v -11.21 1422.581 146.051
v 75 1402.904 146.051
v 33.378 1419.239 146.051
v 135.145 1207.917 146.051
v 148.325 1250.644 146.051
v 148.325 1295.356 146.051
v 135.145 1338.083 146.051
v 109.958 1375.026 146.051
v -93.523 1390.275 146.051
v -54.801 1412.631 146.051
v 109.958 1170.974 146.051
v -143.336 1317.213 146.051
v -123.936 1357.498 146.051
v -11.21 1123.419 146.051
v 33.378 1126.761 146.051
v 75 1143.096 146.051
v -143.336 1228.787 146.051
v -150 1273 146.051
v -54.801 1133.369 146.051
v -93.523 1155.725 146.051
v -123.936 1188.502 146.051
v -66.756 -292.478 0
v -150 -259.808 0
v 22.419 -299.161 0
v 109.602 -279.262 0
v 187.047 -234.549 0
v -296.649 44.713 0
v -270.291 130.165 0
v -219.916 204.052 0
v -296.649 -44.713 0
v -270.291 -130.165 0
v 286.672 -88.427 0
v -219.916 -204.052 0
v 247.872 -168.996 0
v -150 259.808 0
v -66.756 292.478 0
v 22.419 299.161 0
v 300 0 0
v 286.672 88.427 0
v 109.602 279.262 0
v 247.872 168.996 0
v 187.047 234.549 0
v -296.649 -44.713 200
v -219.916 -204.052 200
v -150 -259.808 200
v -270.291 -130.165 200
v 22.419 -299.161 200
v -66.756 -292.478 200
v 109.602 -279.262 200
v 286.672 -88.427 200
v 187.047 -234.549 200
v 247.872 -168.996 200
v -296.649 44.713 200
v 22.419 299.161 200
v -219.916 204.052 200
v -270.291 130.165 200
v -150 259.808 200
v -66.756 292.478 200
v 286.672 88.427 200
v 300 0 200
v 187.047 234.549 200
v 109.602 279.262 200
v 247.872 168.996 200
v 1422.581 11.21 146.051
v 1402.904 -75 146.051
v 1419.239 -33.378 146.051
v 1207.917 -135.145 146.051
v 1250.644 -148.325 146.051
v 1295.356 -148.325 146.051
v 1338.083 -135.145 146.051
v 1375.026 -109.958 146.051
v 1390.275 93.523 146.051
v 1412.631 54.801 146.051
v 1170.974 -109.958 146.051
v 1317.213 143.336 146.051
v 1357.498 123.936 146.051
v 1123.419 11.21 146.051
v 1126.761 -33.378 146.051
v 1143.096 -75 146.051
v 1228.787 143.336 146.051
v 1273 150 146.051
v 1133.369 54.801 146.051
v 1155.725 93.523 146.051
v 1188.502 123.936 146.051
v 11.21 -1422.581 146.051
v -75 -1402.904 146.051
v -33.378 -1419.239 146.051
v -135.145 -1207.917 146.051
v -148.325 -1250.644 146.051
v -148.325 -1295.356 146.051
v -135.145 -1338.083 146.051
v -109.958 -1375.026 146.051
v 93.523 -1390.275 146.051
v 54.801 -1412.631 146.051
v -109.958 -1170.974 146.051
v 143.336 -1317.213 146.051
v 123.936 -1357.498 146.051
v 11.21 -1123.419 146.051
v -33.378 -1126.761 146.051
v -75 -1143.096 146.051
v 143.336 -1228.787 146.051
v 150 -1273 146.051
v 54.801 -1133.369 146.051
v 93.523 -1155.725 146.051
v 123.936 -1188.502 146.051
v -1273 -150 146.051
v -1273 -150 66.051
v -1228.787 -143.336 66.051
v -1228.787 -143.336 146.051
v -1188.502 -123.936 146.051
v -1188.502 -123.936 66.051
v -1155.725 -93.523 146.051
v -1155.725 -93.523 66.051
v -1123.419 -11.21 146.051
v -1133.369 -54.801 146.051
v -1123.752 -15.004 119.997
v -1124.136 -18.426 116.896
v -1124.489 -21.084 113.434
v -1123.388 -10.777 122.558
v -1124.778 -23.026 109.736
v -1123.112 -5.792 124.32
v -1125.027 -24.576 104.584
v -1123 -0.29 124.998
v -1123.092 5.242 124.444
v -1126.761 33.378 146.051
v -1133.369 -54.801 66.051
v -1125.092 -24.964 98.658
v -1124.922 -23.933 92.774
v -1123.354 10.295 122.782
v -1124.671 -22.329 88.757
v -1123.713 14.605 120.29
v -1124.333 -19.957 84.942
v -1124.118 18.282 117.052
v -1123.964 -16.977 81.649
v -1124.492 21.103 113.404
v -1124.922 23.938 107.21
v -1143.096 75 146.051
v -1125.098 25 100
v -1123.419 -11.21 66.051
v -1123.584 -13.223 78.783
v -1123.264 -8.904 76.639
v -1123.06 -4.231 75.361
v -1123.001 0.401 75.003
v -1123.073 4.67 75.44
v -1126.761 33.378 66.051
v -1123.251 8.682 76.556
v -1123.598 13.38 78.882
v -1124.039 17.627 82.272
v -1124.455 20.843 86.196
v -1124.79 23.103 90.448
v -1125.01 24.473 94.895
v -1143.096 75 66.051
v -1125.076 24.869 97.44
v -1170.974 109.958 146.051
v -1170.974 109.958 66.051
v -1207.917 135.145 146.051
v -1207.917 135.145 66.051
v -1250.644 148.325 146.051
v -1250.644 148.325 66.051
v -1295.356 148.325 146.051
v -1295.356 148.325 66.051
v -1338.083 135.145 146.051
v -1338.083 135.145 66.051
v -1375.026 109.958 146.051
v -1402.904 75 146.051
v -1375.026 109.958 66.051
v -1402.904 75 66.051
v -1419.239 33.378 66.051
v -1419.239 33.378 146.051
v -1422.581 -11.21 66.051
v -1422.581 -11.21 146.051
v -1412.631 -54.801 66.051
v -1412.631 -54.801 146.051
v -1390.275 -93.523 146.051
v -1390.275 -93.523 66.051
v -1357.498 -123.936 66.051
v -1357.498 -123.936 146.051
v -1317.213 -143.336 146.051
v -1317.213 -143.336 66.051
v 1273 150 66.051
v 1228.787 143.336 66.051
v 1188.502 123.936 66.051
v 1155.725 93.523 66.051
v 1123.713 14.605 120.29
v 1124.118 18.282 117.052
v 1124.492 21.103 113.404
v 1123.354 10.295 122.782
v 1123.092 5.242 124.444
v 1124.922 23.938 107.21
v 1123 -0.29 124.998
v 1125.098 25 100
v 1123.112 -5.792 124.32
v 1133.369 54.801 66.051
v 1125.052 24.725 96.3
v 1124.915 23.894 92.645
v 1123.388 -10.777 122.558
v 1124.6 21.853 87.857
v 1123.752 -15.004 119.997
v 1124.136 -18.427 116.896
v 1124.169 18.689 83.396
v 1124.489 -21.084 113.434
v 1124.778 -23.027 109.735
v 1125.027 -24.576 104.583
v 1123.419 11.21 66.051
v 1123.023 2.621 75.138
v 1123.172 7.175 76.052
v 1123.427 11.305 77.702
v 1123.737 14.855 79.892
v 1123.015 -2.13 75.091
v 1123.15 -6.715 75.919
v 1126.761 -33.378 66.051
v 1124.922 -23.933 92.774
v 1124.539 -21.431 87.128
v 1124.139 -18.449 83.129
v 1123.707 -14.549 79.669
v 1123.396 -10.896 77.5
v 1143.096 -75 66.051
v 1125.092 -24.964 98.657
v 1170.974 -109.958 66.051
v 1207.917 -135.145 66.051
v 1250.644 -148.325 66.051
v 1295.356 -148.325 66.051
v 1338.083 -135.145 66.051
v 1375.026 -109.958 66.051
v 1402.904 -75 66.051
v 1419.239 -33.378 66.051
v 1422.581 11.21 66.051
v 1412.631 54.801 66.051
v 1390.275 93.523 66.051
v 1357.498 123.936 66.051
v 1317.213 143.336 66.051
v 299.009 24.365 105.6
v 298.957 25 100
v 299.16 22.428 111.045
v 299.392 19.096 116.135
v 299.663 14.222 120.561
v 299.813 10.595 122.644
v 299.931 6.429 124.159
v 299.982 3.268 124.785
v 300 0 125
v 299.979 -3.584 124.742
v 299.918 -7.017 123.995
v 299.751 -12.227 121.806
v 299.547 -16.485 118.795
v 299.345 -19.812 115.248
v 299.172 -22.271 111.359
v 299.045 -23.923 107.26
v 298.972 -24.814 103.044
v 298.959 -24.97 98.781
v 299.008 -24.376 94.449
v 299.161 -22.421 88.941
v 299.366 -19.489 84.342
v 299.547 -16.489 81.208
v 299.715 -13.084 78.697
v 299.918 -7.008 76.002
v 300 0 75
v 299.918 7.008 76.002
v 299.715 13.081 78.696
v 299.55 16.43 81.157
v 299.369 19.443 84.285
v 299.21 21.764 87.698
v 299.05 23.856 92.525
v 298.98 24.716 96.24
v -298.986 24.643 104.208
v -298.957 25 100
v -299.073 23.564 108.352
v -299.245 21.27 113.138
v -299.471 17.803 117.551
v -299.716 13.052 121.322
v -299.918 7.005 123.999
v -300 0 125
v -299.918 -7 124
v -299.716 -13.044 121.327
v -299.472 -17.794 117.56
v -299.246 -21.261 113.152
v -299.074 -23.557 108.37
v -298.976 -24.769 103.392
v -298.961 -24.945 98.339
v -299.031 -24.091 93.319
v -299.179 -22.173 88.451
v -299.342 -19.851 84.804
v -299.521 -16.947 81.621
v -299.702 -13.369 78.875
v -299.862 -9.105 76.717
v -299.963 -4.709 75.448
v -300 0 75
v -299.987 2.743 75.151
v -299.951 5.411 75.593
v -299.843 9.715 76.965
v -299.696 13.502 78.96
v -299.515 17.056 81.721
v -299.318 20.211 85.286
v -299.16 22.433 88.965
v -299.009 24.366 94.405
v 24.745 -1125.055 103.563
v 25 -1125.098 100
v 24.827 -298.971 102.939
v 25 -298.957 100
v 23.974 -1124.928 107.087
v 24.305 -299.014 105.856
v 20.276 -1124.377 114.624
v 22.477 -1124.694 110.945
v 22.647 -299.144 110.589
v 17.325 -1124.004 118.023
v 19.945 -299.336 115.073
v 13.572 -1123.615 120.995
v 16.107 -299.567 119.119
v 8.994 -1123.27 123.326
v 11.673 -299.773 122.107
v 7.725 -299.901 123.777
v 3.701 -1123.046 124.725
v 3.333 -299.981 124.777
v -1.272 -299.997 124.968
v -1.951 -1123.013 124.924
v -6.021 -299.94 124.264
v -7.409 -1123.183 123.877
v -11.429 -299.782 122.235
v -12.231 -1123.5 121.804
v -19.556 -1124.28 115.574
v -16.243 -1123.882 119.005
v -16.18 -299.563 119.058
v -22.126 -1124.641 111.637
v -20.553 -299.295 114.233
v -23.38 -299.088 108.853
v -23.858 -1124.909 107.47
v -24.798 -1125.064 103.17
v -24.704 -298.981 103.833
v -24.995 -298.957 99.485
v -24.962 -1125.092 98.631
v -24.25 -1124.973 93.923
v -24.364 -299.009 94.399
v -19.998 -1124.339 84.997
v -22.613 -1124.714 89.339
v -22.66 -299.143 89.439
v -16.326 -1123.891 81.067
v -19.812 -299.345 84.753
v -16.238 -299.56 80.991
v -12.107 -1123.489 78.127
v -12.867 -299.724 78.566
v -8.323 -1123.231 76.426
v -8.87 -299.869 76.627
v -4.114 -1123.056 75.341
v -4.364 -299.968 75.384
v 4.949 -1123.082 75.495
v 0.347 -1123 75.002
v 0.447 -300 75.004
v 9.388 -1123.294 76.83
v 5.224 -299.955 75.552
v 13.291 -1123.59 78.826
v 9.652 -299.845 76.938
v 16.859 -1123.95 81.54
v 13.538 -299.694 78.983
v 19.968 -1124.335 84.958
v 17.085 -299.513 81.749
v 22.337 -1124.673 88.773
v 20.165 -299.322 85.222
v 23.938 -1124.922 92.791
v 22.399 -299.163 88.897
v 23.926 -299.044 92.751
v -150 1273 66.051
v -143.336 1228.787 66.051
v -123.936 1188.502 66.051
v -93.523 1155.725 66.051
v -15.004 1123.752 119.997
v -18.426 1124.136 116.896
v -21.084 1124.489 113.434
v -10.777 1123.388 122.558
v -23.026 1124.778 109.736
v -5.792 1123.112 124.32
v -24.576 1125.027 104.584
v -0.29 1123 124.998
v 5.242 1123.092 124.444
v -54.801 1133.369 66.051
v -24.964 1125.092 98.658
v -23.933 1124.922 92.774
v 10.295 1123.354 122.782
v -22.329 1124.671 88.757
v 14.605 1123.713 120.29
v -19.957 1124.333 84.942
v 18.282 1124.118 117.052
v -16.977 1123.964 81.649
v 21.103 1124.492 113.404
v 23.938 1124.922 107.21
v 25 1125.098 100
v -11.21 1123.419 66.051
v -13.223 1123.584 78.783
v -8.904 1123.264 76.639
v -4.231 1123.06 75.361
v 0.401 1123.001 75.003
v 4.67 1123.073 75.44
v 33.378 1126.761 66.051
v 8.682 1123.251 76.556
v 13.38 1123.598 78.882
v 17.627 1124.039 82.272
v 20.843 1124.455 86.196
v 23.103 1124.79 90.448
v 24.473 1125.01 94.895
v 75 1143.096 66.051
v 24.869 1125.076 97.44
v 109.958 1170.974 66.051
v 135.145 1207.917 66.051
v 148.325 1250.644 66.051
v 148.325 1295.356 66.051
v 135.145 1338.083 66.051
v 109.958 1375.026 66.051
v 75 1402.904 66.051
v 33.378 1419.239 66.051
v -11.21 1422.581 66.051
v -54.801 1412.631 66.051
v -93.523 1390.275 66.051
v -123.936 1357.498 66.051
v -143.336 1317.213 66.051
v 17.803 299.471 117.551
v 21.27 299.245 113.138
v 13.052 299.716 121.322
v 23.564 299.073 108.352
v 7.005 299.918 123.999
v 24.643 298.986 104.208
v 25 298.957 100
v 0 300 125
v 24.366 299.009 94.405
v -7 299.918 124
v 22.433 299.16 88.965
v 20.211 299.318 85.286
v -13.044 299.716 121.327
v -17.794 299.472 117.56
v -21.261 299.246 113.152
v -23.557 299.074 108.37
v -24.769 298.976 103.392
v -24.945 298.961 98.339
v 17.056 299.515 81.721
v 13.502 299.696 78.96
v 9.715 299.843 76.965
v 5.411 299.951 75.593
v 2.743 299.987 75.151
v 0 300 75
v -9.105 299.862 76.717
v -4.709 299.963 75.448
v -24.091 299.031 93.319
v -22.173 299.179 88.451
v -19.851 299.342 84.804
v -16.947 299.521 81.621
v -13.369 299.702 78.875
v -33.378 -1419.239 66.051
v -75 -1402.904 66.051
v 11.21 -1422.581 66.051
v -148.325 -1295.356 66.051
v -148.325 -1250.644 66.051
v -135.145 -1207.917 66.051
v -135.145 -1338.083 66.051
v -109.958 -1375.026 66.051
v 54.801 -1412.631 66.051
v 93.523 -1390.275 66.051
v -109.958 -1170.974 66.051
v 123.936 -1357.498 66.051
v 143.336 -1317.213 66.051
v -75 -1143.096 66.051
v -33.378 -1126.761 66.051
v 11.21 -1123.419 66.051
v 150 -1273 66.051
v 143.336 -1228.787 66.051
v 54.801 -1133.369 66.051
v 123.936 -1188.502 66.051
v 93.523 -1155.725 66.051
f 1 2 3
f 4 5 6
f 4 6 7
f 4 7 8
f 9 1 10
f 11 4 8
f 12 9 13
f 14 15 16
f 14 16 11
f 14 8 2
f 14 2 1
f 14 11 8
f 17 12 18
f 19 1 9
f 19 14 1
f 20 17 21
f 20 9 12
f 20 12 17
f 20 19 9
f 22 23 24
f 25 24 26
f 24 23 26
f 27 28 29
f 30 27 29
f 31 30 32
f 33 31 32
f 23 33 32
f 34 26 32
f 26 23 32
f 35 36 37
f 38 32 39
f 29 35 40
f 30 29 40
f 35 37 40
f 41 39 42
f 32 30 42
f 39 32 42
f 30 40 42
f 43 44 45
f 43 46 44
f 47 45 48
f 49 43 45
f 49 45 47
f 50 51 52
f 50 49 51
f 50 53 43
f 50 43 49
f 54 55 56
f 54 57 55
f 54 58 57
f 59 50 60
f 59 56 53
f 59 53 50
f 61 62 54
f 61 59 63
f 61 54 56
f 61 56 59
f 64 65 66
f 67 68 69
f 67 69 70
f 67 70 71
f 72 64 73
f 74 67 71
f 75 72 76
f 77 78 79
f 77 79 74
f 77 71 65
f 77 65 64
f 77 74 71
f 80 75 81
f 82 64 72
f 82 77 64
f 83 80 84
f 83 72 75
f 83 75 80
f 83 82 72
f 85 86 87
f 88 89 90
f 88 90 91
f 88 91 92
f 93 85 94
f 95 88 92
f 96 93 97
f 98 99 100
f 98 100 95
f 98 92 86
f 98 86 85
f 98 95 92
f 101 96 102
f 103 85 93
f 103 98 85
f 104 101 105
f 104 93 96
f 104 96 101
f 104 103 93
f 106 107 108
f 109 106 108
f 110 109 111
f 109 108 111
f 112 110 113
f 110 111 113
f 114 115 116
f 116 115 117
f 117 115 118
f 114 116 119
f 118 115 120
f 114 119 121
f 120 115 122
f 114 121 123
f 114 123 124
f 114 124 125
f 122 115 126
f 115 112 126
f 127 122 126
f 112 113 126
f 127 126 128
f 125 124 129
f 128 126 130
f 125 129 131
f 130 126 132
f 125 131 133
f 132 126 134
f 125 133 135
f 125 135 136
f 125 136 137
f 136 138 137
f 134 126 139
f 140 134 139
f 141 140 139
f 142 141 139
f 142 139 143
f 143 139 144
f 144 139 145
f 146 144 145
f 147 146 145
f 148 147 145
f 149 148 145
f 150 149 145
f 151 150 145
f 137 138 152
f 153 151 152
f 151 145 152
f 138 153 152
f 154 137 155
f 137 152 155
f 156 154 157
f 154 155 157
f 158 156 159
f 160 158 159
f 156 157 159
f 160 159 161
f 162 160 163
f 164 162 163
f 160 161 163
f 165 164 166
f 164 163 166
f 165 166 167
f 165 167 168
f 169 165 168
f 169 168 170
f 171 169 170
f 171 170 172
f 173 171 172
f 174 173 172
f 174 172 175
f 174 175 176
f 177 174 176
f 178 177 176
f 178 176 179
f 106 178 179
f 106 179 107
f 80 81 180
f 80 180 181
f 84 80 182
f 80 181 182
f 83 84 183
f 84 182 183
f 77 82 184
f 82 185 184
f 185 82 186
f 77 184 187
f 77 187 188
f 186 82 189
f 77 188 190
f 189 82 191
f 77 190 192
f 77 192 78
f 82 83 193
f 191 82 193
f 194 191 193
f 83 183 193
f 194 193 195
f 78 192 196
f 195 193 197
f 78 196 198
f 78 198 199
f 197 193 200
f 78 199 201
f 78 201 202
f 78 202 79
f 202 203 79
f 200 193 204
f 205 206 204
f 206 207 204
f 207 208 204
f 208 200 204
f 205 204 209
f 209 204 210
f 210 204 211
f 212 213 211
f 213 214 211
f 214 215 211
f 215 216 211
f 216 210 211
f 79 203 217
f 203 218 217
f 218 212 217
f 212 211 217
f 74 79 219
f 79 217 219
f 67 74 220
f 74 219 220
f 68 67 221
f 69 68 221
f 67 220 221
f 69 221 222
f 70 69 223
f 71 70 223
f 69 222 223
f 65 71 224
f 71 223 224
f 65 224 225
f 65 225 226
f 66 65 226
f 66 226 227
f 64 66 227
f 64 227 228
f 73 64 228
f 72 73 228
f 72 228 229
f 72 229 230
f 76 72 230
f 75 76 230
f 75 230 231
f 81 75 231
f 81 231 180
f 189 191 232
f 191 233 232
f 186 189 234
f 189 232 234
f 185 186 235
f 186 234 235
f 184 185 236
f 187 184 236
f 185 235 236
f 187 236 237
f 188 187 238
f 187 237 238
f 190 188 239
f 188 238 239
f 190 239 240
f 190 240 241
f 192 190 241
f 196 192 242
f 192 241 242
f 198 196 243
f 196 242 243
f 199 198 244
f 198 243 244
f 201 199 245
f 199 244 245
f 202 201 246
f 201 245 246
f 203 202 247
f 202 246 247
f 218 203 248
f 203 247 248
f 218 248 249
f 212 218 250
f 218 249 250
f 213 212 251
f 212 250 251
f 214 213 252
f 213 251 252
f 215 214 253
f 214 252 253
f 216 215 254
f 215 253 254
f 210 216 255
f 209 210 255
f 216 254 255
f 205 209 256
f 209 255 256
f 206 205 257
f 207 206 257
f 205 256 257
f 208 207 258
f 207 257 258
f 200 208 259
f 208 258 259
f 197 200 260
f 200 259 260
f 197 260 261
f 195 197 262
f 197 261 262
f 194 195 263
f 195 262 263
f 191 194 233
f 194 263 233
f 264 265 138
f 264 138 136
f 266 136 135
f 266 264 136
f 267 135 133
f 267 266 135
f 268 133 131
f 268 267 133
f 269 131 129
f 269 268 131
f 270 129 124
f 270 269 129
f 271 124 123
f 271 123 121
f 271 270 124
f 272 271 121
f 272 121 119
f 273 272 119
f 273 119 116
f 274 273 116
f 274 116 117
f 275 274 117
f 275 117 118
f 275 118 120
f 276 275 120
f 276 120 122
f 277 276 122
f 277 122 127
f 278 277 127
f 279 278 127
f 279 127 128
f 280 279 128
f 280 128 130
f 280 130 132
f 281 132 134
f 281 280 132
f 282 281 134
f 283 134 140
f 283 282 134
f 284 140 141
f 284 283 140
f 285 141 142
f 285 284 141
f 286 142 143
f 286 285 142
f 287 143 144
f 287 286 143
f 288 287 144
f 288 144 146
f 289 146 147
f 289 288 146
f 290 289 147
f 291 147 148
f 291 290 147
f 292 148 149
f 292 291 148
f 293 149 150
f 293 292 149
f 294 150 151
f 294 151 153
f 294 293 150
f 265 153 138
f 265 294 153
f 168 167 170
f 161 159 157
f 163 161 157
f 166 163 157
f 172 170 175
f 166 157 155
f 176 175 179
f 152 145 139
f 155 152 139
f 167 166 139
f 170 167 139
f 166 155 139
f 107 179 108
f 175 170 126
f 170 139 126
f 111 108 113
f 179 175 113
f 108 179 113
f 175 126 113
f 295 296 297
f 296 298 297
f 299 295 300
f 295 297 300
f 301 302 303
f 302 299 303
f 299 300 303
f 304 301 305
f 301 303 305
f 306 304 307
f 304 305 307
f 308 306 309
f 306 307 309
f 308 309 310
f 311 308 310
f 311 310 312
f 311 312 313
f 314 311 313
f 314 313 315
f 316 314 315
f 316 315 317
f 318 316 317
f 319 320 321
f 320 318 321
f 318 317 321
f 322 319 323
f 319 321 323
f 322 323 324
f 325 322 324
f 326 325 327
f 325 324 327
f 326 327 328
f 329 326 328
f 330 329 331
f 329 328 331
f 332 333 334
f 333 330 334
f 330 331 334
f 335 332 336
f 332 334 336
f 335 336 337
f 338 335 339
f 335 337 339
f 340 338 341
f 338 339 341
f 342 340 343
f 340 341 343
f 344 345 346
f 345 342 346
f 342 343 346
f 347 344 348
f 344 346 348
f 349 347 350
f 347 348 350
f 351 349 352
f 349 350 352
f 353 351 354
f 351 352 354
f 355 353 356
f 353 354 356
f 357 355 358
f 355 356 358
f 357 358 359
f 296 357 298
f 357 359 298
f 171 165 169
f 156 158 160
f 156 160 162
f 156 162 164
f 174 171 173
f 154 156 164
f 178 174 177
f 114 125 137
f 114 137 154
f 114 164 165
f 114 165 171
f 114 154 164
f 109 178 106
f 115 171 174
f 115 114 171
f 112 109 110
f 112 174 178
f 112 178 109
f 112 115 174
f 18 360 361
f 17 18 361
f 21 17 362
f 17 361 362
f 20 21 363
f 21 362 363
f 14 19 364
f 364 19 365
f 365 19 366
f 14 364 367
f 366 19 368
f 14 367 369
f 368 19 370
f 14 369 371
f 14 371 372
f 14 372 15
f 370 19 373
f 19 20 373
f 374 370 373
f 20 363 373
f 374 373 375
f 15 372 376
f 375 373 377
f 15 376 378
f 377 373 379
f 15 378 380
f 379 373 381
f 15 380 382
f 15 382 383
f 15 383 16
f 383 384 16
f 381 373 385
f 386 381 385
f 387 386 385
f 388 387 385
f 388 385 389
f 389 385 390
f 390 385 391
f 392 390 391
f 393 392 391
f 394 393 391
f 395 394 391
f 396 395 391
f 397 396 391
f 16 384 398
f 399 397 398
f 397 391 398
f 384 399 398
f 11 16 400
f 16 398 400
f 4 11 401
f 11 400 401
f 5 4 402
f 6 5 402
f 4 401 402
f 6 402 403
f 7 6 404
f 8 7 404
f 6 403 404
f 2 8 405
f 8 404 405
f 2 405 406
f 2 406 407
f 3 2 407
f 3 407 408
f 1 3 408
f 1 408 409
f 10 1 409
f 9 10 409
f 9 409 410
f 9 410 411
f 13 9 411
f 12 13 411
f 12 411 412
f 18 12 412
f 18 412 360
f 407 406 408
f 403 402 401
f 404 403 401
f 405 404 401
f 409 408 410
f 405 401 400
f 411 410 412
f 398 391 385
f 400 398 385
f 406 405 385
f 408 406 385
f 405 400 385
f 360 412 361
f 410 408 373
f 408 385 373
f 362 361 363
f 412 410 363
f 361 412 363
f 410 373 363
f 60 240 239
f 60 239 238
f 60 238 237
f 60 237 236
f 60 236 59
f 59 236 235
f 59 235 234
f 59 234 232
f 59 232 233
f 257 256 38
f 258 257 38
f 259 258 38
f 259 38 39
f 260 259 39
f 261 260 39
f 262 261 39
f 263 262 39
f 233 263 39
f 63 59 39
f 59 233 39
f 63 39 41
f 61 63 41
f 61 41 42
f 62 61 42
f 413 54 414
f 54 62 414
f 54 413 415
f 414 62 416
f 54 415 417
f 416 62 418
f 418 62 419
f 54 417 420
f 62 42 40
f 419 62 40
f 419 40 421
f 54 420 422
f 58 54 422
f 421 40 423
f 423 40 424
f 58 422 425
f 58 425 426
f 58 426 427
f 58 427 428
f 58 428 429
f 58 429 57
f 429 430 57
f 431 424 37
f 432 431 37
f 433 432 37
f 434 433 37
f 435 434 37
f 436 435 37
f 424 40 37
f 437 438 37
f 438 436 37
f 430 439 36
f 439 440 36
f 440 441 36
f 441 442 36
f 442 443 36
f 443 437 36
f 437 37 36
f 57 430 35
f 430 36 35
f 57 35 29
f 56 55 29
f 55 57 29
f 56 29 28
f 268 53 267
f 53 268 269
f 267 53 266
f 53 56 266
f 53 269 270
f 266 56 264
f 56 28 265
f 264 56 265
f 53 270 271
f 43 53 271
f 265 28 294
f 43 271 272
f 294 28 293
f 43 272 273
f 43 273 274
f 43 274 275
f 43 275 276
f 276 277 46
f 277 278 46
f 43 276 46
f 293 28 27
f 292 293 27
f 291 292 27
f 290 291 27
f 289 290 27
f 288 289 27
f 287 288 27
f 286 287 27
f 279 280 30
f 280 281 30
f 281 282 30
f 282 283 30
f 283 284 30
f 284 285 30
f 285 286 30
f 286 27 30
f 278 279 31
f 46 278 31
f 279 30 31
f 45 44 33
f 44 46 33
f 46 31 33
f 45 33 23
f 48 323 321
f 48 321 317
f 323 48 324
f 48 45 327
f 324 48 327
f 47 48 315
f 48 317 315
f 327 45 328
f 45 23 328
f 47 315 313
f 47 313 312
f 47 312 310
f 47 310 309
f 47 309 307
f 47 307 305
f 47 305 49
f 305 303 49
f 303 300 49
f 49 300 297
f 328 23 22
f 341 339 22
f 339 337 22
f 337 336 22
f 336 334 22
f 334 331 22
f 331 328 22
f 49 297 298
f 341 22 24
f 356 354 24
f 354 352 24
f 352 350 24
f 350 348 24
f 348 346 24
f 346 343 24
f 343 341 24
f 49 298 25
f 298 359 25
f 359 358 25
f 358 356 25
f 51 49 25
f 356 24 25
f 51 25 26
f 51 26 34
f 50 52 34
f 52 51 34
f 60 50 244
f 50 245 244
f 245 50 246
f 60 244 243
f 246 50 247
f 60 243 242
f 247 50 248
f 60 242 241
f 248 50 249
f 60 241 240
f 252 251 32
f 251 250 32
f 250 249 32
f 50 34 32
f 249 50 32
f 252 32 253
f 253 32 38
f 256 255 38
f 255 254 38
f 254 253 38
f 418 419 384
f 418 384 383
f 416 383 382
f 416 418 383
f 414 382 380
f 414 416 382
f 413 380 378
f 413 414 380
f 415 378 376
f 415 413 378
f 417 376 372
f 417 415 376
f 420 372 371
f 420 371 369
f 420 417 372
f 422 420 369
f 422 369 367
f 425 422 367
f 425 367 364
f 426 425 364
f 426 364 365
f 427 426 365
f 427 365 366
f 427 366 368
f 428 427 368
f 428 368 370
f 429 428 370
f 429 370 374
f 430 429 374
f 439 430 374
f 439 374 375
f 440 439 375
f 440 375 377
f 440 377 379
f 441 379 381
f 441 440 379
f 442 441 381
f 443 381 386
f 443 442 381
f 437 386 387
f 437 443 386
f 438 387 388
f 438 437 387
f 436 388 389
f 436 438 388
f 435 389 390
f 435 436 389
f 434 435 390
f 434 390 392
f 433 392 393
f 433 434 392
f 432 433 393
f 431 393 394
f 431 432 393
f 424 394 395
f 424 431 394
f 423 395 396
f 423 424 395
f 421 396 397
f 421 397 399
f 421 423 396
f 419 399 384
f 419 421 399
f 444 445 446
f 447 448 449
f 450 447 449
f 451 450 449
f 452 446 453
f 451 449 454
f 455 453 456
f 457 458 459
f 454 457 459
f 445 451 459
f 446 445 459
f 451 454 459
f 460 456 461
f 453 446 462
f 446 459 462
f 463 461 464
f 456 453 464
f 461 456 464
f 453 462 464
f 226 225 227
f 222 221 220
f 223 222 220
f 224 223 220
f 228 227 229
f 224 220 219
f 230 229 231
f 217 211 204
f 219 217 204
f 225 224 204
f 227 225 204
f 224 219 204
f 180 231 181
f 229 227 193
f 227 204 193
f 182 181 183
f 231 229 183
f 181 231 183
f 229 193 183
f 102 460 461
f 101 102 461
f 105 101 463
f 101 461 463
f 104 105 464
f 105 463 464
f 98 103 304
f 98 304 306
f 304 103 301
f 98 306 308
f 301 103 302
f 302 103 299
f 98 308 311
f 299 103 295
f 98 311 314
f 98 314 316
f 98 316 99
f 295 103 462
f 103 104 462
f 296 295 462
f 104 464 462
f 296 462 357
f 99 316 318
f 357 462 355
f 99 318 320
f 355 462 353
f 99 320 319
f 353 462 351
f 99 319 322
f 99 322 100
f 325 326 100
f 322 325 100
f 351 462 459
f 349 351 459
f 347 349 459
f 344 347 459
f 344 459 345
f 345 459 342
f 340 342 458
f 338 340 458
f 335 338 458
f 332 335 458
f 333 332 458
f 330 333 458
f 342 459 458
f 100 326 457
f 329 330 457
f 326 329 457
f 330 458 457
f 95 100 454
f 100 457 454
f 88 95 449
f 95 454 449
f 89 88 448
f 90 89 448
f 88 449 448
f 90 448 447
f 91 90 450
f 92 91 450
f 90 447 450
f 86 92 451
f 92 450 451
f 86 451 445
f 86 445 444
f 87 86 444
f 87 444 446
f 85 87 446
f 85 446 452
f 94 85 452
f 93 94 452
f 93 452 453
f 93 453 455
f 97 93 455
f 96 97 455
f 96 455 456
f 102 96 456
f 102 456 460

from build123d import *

# Parameters (mm, degrees)
F0_R          = 300
F1_DEPTH      = 200
F2_R          = 25
F3_DEPTH      = 1273
F3_DEPTH_BACK = 1273
F4_COUNT      = 2
F4_ANGLE      = 90
F5_W          = 20.2650688589
F5_H          = 12.1021300554
F6_DEPTH      = 25
F7_R          = 150
F7_W          = 20.2650688589
F7_H          = 25
F8_DEPTH      = 40
F8_DEPTH_BACK = 40
F9_COUNT      = 4


with BuildPart() as f1:
    # F0 (on Top) → F1 (new body)
    with BuildSketch(Plane.XY):
        Circle(F0_R)
    extrude(amount=F1_DEPTH)

    # F2 (on Front) → F3 (join, two sides)
    with BuildSketch(Plane.XZ) as f3_sk:
        with Locations((0, 100)):
            Circle(F2_R)
    extrude(amount=F3_DEPTH)
    extrude(f3_sk.sketch, amount=-F3_DEPTH_BACK)

    # F4: F1 ×2 about axis
    f4_axis = Axis((0, 0, 200), (0, 0, 1))


with BuildPart() as f1_1:
    add(f1.part)
    for i in range(1, F4_COUNT):
        add(f1.part.rotate(f4_axis, i * F4_ANGLE / (F4_COUNT - 1)))

    # F5 (on face) → F6 (join)
    with BuildSketch(Plane.XZ.offset(1273)):
        with Locations((0, 100)):
            Rectangle(F5_W, F5_H)
    extrude(amount=F6_DEPTH)

    # F7 (on face) → F8 (join, two sides)
    with BuildSketch(Plane.XY.offset(106.0510650277)) as f8_sk:
        with Locations((0, -1273)):
            Circle(F7_R)
        with Locations((0, -1285.5)):
            Rectangle(F7_W, F7_H, mode=Mode.SUBTRACT)
        with Locations((0, -1285.5)):
            Rectangle(F7_W, F7_H)
    extrude(amount=-F8_DEPTH)
    extrude(f8_sk.sketch, amount=F8_DEPTH_BACK)

    # F9: F1 ×4 about axis
    f9_axis = Axis((0, 0, 200), (0, 0, -1))


with BuildPart() as f1_2:
    add(f1_1.part)
    for i in range(1, F9_COUNT):
        add(f1_1.part.rotate(f9_axis, i * 360 / F9_COUNT))


solid = f1_2.part
